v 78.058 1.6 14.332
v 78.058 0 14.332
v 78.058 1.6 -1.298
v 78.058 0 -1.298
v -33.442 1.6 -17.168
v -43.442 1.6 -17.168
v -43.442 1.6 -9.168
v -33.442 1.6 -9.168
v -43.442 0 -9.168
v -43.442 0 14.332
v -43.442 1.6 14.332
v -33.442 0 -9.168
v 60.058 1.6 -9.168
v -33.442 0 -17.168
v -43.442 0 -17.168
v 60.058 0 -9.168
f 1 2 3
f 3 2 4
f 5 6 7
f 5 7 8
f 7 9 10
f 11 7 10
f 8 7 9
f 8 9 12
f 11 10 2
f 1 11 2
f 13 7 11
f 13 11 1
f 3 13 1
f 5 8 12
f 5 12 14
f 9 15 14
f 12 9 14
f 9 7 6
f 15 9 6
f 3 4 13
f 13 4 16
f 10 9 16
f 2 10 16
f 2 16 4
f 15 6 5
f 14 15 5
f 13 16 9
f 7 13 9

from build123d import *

# Parameters (mm, degrees)
BOSS_EXTRUDE1_DEPTH = 1.6
SKETCH2_W           = 10
SKETCH2_H           = 8
BOSS_EXTRUDE2_DEPTH = 1.6


with BuildPart() as part:
    # Sketch1 → Boss-Extrude1 (new body)
    with BuildSketch(Plane(origin=(0, 0, 0), x_dir=(1, 0, 0), z_dir=(0, 1, 0))):
        Polygon((-43.44244898, 9.167959184), (-43.44244898, -14.332040816), (78.05755102, -14.332040816), (78.05755102, 1.297959184), (60.05755102, 9.167959184), align=None)
    extrude(amount=BOSS_EXTRUDE1_DEPTH)


with BuildPart() as body_2:
    # Sketch2 → Boss-Extrude2 (new body)
    with BuildSketch(Plane(origin=(0, 1.6, 0), x_dir=(1, 0, 0), z_dir=(0, 1, 0))):
        with Locations((-38.44244898, 13.167959184)):
            Rectangle(SKETCH2_W, SKETCH2_H)
    extrude(amount=-BOSS_EXTRUDE2_DEPTH)


solid = Compound([part.part, body_2.part])
